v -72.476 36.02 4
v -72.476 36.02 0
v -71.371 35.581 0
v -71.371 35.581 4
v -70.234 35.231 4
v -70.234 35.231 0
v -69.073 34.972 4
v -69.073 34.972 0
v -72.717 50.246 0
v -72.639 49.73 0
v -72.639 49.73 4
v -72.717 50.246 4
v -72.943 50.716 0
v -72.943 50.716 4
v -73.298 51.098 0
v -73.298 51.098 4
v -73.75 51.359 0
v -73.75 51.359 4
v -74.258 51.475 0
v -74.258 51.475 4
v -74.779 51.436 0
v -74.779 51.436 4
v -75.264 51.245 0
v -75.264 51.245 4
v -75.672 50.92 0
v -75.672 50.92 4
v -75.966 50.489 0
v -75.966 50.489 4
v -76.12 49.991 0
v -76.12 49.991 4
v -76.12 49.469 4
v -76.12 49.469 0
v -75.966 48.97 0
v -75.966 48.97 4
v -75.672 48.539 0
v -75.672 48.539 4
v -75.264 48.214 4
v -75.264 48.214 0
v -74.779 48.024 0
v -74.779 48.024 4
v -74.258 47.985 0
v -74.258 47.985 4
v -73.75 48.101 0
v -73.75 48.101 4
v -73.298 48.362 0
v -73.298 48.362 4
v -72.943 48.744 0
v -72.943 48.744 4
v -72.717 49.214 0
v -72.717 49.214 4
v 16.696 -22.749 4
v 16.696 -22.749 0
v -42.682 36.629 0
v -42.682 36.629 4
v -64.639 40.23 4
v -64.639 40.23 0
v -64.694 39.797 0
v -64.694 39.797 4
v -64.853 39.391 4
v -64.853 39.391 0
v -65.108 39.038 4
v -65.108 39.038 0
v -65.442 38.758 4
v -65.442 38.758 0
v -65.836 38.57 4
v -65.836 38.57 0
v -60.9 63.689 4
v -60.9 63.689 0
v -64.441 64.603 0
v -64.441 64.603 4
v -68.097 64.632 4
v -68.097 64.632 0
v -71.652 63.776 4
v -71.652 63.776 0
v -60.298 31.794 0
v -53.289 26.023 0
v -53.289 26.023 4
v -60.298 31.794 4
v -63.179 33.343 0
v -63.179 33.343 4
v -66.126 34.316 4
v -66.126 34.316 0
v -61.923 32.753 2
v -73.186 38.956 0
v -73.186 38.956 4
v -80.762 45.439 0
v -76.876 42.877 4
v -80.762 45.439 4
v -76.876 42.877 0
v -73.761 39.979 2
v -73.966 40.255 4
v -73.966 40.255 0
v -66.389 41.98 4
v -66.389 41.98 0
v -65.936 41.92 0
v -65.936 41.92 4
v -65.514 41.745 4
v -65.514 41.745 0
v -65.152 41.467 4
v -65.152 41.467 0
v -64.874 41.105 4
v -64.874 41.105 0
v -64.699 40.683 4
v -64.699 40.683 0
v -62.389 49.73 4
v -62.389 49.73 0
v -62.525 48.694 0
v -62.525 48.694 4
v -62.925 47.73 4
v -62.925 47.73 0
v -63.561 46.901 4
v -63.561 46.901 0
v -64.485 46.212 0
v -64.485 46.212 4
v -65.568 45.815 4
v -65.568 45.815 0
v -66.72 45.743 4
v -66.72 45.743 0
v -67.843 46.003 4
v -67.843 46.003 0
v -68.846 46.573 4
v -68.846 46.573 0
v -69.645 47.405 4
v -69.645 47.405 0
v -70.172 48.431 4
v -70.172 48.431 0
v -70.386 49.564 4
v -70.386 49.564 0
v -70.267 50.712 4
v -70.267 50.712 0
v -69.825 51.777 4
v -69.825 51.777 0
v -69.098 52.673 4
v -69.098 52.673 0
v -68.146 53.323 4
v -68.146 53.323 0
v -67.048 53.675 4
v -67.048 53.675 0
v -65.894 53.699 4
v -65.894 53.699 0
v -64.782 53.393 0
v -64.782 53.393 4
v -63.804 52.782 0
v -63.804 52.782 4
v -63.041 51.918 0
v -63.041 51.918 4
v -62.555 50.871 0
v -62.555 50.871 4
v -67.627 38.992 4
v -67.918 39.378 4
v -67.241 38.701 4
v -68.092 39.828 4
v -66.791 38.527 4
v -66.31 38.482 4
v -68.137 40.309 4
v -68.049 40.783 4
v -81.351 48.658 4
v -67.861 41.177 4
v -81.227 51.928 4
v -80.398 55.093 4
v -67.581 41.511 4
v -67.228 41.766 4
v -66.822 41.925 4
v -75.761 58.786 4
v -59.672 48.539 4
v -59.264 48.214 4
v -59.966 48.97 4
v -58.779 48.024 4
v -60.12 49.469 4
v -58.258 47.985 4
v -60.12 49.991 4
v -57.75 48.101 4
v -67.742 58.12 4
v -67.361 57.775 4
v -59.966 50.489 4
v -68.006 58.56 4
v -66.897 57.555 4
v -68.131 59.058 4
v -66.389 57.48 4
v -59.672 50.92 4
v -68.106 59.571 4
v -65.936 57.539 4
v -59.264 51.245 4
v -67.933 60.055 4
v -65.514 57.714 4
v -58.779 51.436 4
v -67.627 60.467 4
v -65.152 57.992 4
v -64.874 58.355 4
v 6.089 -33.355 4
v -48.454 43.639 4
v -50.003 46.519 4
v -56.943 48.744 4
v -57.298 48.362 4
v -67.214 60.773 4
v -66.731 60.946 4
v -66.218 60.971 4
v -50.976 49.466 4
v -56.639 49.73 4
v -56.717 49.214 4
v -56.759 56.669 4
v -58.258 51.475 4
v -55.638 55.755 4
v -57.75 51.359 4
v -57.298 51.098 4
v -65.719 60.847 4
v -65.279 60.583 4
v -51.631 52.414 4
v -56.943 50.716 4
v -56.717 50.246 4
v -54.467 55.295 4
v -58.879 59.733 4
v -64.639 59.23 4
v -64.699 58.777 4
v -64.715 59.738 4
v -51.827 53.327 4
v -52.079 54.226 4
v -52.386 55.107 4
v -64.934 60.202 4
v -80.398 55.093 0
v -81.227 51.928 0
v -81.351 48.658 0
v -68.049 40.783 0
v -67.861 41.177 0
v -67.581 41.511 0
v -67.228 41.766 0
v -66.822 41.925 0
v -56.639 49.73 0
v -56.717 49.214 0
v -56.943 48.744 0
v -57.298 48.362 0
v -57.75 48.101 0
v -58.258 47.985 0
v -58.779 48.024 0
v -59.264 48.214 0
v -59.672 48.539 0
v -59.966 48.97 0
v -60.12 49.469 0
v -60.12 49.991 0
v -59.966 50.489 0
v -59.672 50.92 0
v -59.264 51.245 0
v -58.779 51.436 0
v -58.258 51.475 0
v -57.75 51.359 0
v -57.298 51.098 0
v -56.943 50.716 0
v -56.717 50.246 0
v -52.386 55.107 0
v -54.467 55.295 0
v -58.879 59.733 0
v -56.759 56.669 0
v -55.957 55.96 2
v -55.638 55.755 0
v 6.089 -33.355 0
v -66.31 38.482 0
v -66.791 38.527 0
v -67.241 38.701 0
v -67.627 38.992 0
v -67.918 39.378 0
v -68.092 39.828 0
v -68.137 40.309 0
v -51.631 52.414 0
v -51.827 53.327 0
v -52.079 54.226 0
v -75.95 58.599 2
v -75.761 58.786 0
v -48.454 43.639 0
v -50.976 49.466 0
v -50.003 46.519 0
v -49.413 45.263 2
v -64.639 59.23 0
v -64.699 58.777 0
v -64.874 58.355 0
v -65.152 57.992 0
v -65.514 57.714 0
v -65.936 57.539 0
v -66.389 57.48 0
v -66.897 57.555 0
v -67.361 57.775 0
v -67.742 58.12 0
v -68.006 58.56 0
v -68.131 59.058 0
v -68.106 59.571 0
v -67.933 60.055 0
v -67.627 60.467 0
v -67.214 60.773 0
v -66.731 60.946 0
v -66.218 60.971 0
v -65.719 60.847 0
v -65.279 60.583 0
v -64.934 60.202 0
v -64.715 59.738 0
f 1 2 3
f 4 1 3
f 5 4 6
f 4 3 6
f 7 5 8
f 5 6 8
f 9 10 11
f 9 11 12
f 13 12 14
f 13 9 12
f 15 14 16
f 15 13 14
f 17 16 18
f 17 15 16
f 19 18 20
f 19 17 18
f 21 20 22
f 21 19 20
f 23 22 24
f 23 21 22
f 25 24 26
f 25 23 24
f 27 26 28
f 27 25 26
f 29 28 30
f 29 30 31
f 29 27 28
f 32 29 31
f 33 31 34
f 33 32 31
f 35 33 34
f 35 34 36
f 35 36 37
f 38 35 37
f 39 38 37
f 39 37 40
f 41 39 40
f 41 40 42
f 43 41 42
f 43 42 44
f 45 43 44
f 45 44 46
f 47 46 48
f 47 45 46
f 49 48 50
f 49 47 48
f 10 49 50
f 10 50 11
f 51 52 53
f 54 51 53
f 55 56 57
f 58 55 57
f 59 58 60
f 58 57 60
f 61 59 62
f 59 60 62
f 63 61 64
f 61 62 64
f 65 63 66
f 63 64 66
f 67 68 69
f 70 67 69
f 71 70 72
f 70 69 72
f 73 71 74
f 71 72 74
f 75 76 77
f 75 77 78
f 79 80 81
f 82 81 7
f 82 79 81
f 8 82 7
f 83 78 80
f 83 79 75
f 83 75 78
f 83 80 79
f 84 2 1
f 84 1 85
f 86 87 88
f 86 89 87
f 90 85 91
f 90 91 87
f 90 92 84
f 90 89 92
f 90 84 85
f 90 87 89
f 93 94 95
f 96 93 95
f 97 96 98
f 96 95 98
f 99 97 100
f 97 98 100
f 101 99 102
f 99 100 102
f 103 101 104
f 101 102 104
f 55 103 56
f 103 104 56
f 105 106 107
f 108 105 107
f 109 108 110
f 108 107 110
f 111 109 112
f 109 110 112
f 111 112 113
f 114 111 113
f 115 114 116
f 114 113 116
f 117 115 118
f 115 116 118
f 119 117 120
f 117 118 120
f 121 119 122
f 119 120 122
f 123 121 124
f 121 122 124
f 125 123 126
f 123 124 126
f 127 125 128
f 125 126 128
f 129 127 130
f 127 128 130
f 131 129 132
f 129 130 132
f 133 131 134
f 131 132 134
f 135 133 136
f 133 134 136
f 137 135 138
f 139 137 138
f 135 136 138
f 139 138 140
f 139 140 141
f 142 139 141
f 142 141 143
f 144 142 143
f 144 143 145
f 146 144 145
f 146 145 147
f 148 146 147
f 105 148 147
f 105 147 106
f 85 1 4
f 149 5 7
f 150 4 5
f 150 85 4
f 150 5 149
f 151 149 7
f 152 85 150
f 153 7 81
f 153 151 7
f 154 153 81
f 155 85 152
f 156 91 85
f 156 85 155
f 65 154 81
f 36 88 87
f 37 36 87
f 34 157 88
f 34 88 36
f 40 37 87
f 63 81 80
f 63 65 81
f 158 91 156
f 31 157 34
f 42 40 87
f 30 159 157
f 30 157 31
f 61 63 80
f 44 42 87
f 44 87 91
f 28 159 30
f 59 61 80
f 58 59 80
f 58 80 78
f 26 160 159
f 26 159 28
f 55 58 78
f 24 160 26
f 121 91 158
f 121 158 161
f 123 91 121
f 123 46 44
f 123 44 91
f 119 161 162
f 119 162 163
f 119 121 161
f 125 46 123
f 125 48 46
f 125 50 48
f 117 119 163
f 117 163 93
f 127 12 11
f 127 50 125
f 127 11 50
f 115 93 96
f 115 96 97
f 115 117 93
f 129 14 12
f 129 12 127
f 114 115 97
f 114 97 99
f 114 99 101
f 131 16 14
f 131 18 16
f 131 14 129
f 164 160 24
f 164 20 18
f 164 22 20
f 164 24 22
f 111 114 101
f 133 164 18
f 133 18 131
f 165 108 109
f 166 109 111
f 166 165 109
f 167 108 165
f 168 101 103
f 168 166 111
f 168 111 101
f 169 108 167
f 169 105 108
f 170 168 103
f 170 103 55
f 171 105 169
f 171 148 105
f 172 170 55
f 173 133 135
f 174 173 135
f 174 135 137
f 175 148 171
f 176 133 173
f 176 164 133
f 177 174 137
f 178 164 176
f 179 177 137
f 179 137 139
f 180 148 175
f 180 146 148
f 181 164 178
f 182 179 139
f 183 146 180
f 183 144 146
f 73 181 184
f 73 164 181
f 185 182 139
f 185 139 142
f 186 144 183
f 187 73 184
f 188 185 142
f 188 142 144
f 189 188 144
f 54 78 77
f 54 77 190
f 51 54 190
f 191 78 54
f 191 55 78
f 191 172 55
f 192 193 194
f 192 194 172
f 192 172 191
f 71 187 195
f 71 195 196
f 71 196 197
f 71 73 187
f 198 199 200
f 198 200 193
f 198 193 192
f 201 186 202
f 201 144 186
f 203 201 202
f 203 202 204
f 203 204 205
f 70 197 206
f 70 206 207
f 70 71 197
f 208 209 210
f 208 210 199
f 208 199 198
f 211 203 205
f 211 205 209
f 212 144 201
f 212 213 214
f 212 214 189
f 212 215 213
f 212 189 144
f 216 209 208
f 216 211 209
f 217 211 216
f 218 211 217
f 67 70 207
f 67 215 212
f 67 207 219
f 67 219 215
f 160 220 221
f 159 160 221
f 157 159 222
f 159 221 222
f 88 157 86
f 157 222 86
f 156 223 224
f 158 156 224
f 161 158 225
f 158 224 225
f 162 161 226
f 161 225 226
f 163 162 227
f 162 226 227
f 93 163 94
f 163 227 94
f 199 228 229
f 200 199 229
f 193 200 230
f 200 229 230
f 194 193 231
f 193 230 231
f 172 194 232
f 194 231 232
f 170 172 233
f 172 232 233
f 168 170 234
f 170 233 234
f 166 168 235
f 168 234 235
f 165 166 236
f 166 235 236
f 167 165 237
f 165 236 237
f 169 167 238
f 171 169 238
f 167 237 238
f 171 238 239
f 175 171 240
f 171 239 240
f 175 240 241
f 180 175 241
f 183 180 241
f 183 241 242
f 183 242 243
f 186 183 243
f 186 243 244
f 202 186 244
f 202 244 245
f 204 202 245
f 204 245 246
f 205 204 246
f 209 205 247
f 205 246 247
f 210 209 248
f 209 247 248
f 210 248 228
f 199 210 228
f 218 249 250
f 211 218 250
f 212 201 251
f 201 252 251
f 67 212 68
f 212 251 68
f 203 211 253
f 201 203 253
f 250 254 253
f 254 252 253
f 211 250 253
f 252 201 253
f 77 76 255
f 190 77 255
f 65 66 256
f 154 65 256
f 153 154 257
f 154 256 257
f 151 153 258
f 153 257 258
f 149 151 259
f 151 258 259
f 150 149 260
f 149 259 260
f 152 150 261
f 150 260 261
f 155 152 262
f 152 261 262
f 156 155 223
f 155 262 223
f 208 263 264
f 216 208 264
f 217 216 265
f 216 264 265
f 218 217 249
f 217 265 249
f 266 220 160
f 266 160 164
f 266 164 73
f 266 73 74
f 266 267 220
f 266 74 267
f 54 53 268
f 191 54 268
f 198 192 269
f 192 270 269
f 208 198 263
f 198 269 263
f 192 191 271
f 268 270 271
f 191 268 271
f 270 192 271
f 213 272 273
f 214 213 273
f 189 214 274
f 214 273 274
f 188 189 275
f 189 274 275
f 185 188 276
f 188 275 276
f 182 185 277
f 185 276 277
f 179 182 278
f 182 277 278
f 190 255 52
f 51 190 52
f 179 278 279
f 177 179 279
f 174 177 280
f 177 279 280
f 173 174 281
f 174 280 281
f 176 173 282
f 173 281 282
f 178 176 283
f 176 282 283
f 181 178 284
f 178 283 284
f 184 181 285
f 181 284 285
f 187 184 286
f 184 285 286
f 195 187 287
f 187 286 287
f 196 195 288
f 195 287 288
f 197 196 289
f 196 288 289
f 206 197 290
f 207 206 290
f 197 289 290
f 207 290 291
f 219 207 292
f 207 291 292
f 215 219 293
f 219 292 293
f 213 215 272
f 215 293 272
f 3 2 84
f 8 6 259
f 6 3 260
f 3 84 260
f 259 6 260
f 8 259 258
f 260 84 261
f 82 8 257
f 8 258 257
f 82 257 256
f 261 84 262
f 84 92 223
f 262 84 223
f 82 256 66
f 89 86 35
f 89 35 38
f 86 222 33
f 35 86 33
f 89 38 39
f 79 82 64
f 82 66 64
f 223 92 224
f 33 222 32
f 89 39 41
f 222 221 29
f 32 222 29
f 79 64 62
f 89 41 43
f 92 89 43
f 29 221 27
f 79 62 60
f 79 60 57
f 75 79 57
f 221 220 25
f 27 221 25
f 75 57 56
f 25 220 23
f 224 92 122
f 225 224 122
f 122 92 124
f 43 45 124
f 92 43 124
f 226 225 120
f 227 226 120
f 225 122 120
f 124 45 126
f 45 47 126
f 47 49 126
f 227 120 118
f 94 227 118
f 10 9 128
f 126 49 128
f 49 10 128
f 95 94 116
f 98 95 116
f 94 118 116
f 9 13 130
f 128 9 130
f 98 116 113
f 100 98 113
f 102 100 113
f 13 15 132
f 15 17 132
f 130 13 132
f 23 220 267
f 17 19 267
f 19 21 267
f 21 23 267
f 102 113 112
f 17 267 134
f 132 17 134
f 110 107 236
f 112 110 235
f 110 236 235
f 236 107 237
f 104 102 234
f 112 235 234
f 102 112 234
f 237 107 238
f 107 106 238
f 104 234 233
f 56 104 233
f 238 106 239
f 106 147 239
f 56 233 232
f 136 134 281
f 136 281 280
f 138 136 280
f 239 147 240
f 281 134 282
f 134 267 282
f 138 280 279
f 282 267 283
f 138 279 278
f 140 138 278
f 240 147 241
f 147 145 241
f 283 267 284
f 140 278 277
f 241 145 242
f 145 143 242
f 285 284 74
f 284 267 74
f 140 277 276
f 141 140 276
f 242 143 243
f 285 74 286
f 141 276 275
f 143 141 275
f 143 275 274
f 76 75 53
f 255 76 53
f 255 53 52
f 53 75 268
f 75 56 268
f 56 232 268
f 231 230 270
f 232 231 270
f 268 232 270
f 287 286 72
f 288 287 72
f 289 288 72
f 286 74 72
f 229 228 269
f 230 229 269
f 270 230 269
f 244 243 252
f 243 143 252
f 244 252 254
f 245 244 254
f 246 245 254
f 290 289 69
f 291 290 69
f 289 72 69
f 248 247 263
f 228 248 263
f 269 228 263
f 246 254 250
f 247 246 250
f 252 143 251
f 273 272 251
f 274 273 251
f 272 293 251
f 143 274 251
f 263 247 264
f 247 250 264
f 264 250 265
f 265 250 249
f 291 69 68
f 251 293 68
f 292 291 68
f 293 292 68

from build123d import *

# Parameters (mm, degrees)
F0_R     = 1.75
F1_DEPTH = 4


with BuildPart() as f1:
    # F0 (on Top) → F1 (new body)
    with BuildSketch(Plane.XY):
        with BuildLine():
            Line((6.0892546755, -33.3552707336), (11.3925555344, -28.0519698747))
            Line((11.3925555344, -28.0519698747), (-9.3547162967, -7.3046980436))
            Line((-9.3547162967, -7.3046980436), (-55.7825886783, 39.1231743381))
            ThreePointArc((-55.7825886783, 39.1231743381), (-58.8891903961, 36.7393949991), (-62.5069047196, 35.2408886615))
            Line((-62.5069047196, 35.2408886615), (-53.2885795254, 26.0225634673))
            Line((-53.2885795254, 26.0225634673), (6.0892546755, -33.3552707336))
        make_face()
        with BuildLine():
            Line((-9.3547162967, -7.3046980436), (11.3925555344, -28.0519698747))
            Line((11.3925555344, -28.0519698747), (16.6958563933, -22.7486690158))
            Line((16.6958563933, -22.7486690158), (-42.6819778076, 36.6291651851))
            add(Edge.make_bspline(
                [(-42.6819778076, 36.6291651851), (-45.2945511903, 39.5061130095), (-50.0695074398, 44.7616576166), (-51.1430333829, 50.0297724966), (-51.6312848813, 52.4138447612)],
                knots=[0, 0, 0, 0, 0.5473526332, 1, 1, 1, 1], degree=3))
            ThreePointArc((-51.6312848813, 52.4138447612), (-51.4017631208, 49.1157535279), (-51.9003030018, 45.8474903793))
            ThreePointArc((-51.9003030018, 45.8474903793), (-53.3988093394, 42.2297760559), (-55.7825886783, 39.1231743381))
            Line((-55.7825886783, 39.1231743381), (-9.3547162967, -7.3046980436))
        make_face()
        with BuildLine():
            ThreePointArc((-62.5069047196, 35.2408886615), (-58.8891903961, 36.7393949991), (-55.7825886783, 39.1231743381))
            ThreePointArc((-55.7825886783, 39.1231743381), (-53.3988093394, 42.2297760559), (-51.9003030018, 45.8474903793))
            ThreePointArc((-51.9003030018, 45.8474903793), (-51.4017631208, 49.1157535279), (-51.6312848813, 52.4138447612))
            ThreePointArc((-51.6312848813, 52.4138447612), (-51.9458010107, 53.7780476698), (-52.3861331822, 55.1069861748))
            add(Edge.make_bspline(
                [(-52.3861331822, 55.1069861748), (-53.6051347333, 55.1308330266), (-56.7515994276, 55.1918775104), (-59.3237157089, 60.4625666695), (-60.9000344454, 63.6893307389)],
                knots=[0, 0, 0, 0, 0.387493123, 1, 1, 1, 1], degree=3))
            ThreePointArc((-60.9000344454, 63.6893307389), (-66.2678346698, 64.7292851408), (-71.6517589086, 63.7763191413))
            add(Edge.make_bspline(
                [(-80.3976496024, 55.0928974107), (-78.8782096295, 56.1643689504), (-75.6891919016, 58.3945745707), (-73.0396610336, 61.9384087083), (-71.6517589086, 63.7763191413)],
                knots=[0, 0, 0, 0, 0.4784709271, 1, 1, 1, 1], degree=3))
            ThreePointArc((-80.3976496024, 55.0928974107), (-81.3784942248, 50.296142309), (-80.7624173443, 45.4390480176))
            add(Edge.make_bspline(
                [(-72.4758721042, 36.0202061945), (-72.6700492153, 37.3502311658), (-73.1313035357, 40.642383964), (-77.9288722558, 43.6485061475), (-80.7624173443, 45.4390480176)],
                knots=[0, 0, 0, 0, 0.4064160365, 1, 1, 1, 1], degree=3))
            ThreePointArc((-72.4758721042, 36.0202061945), (-70.8057804399, 35.3947234788), (-69.0732591015, 34.971870541))
            ThreePointArc((-69.0732591015, 34.971870541), (-65.7751678682, 34.7423487805), (-62.5069047196, 35.2408886615))
        make_face()
        with Locations((-74.3891903961, 49.7297760559)):
            Circle(F0_R, mode=Mode.SUBTRACT)
        with BuildLine():
            ThreePointArc((-64.6391903961, 40.2297760559), (-64.9694713976, 39.2065957368), (-65.8356452136, 38.5696291555))
            ThreePointArc((-65.8356452136, 38.5696291555), (-67.6266272632, 38.9923391888), (-68.0493372965, 40.7833212384))
            ThreePointArc((-68.0493372965, 40.7833212384), (-67.4123707152, 41.6494950544), (-66.3891903961, 41.9797760559))
            ThreePointArc((-66.3891903961, 41.9797760559), (-65.1517535291, 41.4672129229), (-64.6391903961, 40.2297760559))
        make_face(mode=Mode.SUBTRACT)
        with BuildLine():
            ThreePointArc((-62.3891903961, 49.7297760559), (-62.6936722661, 48.1990423264), (-63.5607632714, 46.9013489311))
            ThreePointArc((-63.5607632714, 46.9013489311), (-70.0847085262, 51.2605097853), (-62.3891903961, 49.7297760559))
        make_face(mode=Mode.SUBTRACT)
        with BuildLine():
            ThreePointArc((-60.1391903961, 49.7297760559), (-58.3891903961, 51.4797760559), (-56.6391903961, 49.7297760559))
            ThreePointArc((-56.6391903961, 49.7297760559), (-58.3891903961, 47.9797760559), (-60.1391903961, 49.7297760559))
        make_face(mode=Mode.SUBTRACT)
        with BuildLine():
            ThreePointArc((-66.3891903961, 57.4797760559), (-67.6266272632, 60.4672129229), (-64.6391903961, 59.2297760559))
            ThreePointArc((-64.6391903961, 59.2297760559), (-65.1517535291, 57.9923391888), (-66.3891903961, 57.4797760559))
        make_face(mode=Mode.SUBTRACT)
        with BuildLine():
            add(Edge.make_bspline(
                [(-53.2885795254, 26.0225634673), (-56.1655273498, 28.63513685), (-61.4210719568, 33.4100930995), (-66.6891868368, 34.4836190426), (-69.0732591015, 34.971870541)],
                knots=[0, 0, 0, 0, 0.5473526332, 1, 1, 1, 1], degree=3))
            Line((-53.2885795254, 26.0225634673), (-62.5069047196, 35.2408886615))
            ThreePointArc((-62.5069047196, 35.2408886615), (-65.7751678682, 34.7423487805), (-69.0732591015, 34.971870541))
        make_face()
    extrude(amount=F1_DEPTH)


solid = f1.part
